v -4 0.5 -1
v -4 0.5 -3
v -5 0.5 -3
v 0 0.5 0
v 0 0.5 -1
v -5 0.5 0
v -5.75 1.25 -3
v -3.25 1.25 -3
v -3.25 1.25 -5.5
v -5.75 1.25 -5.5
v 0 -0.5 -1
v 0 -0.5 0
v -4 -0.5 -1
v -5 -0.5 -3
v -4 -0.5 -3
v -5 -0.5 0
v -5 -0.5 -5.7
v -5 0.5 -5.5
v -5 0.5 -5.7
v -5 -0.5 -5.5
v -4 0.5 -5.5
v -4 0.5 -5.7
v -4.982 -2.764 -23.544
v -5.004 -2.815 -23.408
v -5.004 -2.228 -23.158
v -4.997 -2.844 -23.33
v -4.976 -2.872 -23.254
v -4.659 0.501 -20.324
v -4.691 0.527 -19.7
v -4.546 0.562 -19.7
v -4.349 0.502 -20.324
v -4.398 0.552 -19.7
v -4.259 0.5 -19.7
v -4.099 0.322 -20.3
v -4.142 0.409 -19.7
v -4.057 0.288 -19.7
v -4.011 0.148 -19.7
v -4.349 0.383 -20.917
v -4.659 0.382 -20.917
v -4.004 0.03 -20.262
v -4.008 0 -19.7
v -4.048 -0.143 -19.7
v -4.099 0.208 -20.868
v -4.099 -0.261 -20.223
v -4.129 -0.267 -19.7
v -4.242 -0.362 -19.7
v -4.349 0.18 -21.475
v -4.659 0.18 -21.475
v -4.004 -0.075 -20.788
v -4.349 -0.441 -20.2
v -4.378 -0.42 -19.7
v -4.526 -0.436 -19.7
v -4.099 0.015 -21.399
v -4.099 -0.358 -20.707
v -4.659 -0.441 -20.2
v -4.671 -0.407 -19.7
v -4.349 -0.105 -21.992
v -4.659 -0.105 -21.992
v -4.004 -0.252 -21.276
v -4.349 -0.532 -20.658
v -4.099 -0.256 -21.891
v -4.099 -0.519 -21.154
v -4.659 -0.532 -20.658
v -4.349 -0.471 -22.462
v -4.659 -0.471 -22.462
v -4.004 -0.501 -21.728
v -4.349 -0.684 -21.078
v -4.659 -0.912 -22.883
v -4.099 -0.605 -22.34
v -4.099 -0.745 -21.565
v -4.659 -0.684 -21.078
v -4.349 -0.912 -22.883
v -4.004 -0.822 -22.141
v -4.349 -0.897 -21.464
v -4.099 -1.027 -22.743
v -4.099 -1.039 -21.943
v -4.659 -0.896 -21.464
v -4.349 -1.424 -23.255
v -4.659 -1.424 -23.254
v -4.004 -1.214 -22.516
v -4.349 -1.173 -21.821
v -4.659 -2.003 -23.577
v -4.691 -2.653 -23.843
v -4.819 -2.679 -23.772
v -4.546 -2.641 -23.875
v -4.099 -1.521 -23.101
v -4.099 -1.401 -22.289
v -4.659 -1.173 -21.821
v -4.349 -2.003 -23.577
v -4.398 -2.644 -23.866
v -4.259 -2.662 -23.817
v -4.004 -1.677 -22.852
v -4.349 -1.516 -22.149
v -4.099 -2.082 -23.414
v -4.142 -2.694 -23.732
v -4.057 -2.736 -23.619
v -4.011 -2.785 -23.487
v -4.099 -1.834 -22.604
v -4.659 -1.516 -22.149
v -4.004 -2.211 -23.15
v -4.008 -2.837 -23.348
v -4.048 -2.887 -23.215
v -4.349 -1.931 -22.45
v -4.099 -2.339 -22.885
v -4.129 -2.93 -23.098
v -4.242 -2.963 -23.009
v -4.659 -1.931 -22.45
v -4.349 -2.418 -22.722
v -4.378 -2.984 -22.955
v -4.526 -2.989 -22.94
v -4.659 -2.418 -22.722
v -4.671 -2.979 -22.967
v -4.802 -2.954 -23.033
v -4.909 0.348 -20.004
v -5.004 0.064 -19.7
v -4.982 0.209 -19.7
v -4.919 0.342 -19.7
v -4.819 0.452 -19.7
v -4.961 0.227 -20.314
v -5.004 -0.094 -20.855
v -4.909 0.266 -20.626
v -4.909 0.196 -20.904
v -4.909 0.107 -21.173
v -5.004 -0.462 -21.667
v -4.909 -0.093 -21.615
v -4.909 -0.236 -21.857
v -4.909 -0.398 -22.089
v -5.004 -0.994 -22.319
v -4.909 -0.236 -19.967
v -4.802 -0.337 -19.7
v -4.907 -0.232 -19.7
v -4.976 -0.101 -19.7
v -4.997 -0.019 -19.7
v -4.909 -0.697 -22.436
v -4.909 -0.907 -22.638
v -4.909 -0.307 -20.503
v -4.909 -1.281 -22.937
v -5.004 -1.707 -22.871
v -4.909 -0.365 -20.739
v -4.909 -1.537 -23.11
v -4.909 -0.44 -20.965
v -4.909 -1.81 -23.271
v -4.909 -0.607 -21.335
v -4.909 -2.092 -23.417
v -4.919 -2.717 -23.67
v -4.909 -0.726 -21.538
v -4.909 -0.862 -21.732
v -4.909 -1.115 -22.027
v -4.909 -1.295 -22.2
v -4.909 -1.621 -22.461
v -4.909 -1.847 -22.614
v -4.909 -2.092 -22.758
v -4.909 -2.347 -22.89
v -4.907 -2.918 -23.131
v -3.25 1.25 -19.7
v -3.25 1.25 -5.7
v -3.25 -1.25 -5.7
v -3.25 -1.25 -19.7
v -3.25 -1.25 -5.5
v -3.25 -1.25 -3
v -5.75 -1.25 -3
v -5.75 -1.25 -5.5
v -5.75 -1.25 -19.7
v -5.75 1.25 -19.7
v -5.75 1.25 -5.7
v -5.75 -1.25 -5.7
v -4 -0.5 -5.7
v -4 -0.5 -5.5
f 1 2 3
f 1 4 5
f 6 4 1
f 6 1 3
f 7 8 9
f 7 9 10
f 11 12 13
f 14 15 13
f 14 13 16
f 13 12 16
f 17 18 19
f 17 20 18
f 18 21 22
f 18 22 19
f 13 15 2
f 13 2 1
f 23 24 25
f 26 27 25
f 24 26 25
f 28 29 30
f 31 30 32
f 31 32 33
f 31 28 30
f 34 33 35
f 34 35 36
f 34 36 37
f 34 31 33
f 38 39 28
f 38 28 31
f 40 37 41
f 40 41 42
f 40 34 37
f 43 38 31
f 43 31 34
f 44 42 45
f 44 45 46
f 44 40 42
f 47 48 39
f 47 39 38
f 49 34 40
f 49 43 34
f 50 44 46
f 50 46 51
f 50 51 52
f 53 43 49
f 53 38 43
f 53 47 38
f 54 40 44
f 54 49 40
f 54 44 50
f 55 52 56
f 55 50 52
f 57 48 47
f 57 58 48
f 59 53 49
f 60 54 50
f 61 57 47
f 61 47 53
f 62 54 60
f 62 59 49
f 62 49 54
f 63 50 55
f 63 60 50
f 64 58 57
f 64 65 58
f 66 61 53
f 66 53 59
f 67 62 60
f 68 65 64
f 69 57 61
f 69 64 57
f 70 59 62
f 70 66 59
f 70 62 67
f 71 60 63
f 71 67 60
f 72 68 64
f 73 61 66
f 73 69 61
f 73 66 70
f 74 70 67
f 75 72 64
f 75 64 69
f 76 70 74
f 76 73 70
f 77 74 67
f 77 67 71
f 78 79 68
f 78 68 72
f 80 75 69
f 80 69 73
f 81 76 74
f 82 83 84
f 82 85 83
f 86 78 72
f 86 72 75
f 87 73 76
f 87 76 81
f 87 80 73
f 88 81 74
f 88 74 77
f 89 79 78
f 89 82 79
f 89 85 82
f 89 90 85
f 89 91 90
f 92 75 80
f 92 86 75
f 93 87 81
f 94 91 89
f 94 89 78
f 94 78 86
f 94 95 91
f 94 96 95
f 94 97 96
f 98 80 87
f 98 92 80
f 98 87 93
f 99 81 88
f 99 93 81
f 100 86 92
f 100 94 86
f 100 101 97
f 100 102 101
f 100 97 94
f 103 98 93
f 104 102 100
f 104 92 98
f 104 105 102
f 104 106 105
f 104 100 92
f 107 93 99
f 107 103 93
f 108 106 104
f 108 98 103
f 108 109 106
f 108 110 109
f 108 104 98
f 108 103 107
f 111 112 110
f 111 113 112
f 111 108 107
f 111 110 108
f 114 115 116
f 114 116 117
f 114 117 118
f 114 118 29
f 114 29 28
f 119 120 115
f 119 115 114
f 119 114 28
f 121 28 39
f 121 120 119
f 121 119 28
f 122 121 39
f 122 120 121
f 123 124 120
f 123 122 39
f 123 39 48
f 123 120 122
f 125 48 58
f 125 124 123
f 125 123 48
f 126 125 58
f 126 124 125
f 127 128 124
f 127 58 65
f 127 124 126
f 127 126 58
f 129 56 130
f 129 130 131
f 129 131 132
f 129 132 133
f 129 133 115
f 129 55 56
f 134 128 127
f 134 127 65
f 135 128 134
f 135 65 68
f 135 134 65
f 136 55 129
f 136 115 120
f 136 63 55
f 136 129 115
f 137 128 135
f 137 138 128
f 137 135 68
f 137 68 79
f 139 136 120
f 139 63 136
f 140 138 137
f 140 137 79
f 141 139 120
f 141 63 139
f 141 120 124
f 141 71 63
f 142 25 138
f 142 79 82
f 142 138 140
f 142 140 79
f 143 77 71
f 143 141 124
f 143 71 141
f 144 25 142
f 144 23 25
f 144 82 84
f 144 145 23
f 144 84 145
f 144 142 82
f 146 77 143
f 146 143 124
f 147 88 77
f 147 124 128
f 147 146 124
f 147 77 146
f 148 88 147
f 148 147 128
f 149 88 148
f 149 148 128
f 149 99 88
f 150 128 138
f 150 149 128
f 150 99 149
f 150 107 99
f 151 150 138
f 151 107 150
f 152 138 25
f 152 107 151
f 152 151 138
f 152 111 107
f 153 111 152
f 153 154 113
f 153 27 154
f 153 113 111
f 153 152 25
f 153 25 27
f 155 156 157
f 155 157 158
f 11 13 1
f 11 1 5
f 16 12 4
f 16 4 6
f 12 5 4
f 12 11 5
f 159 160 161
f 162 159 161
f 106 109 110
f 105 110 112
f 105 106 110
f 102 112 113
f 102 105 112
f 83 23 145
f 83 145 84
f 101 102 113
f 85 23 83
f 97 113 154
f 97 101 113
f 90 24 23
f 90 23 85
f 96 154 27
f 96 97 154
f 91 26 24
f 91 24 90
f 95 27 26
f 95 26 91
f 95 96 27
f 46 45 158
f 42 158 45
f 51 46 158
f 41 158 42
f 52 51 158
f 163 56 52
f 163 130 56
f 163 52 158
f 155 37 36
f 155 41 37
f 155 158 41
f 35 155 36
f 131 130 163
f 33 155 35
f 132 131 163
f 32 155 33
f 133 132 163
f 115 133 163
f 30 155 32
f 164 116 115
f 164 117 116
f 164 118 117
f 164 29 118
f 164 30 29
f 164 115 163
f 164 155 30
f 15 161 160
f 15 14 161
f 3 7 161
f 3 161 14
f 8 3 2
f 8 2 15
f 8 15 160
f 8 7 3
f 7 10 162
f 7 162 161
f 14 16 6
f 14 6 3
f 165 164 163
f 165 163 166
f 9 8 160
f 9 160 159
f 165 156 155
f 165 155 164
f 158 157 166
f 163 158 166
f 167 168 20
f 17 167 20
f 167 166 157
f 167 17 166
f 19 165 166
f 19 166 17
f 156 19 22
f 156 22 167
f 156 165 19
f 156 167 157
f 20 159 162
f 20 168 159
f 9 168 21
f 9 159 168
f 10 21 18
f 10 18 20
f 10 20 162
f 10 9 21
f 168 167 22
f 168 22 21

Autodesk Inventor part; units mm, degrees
ref_plane "YZ Plane" through (0, 0, 0) normal (1, 0, 0) x (0, 1, 0)
ref_plane "XZ Plane" through (0, 0, 0) normal (0, 1, 0) x (-1, 0, 0)
sketch "Sketch1" plane through (0, 0, 0) normal (0, 1, 0) x (-1, 0, 0)
  line L0 (0, 0) -> (5, 0)
  line L1 (5, 0) -> (5, -13)
  line L2 (5, -13) -> (4, -13)
  line L3 (4, -13) -> (4, -1)
  line L4 (4, -1) -> (0, -1)
  line L5 (0, -1) -> (0, 0)
  line L6 (5.75, -3) -> (3.25, -3)
  line L7 (3.25, -3) -> (3.25, -5.5)
  line L8 (3.25, -5.5) -> (5.75, -5.5)
  line L9 (5.75, -5.5) -> (5.75, -3)
  line L10 (4.5, -1.8535) -> (4.5, -3.6396) construction
  line L11 (5.75, -5.7) -> (3.25, -5.7)
  line L12 (3.25, -5.7) -> (3.25, -19.7)
  line L13 (3.25, -19.7) -> (5.75, -19.7)
  line L14 (5.75, -19.7) -> (5.75, -5.7)
  dimension "d0" = 4
  dimension "d1" = 5
  dimension "d2" = 2.5
  dimension "d3" = 2.5
  dimension "d4" = 2
  dimension "d16" = 0.2
  dimension "d19" = 14
  dimension "d20" = 7.5
extrude "Extrusion1" add sketch "Sketch1" along normal blind 0.5 and the other way blind 0.5 contours L0 L1 L6 L3 L4 L5 | L1 L8 L3 L6 | L1 L11 L3 L8 | L1 L2 L3 L11
extrude "Extrusion2" add sketch "Sketch1" against normal blind 1.25 and the other way blind 1.25 contours L6 L9 L8 L1 | L1 L8 L3 L6 | L3 L8 L7 L6 | L11 L14 L13 L12 L3 L2 L1 | L1 L2 L3 L11
sketch "Sketch2" plane through (-3.25, -1.25, -19.7) normal (0, 0, -1) x (-1, 0, 0)
  line L0 (1.25, 3.4717) -> (1.25, -1.4422) construction
ref_plane "Work Plane1" through (-4.5, 2.2217, -19.7) normal (1, 0, 0) x (0, -1, 0)
sketch "Sketch3" plane through (-4.5, 2.2217, -19.7) normal (1, 0, 0) x (0, -1, 0)
  line L0 (2.2217, 0.0174) -> (2.2217, 2.5917) construction
  line L1 (2.2217, 2.5917) -> (5.0748, 3.6547) construction
  spline S0 degree 2 poles (2.2217, 0.0174) (2.2217, 2.5917) (5.0748, 3.6547) knots 1 1 1 2 2 2
  point P0 (2.2217, -19.7)
sketch "Sketch4" plane through (-3.25, -1.25, -19.7) normal (0, 0, -1) x (-1, 0, 0)
  circle A0 centre (1.2535, 1.3137) radius 0.5
  point P0 (-3.25, 1.25)
  dimension "d22" = 1
sweep "Sweep1" add profiles "Sketch4" path "Sketch3"
properties part number "Pin-connector-angled"
